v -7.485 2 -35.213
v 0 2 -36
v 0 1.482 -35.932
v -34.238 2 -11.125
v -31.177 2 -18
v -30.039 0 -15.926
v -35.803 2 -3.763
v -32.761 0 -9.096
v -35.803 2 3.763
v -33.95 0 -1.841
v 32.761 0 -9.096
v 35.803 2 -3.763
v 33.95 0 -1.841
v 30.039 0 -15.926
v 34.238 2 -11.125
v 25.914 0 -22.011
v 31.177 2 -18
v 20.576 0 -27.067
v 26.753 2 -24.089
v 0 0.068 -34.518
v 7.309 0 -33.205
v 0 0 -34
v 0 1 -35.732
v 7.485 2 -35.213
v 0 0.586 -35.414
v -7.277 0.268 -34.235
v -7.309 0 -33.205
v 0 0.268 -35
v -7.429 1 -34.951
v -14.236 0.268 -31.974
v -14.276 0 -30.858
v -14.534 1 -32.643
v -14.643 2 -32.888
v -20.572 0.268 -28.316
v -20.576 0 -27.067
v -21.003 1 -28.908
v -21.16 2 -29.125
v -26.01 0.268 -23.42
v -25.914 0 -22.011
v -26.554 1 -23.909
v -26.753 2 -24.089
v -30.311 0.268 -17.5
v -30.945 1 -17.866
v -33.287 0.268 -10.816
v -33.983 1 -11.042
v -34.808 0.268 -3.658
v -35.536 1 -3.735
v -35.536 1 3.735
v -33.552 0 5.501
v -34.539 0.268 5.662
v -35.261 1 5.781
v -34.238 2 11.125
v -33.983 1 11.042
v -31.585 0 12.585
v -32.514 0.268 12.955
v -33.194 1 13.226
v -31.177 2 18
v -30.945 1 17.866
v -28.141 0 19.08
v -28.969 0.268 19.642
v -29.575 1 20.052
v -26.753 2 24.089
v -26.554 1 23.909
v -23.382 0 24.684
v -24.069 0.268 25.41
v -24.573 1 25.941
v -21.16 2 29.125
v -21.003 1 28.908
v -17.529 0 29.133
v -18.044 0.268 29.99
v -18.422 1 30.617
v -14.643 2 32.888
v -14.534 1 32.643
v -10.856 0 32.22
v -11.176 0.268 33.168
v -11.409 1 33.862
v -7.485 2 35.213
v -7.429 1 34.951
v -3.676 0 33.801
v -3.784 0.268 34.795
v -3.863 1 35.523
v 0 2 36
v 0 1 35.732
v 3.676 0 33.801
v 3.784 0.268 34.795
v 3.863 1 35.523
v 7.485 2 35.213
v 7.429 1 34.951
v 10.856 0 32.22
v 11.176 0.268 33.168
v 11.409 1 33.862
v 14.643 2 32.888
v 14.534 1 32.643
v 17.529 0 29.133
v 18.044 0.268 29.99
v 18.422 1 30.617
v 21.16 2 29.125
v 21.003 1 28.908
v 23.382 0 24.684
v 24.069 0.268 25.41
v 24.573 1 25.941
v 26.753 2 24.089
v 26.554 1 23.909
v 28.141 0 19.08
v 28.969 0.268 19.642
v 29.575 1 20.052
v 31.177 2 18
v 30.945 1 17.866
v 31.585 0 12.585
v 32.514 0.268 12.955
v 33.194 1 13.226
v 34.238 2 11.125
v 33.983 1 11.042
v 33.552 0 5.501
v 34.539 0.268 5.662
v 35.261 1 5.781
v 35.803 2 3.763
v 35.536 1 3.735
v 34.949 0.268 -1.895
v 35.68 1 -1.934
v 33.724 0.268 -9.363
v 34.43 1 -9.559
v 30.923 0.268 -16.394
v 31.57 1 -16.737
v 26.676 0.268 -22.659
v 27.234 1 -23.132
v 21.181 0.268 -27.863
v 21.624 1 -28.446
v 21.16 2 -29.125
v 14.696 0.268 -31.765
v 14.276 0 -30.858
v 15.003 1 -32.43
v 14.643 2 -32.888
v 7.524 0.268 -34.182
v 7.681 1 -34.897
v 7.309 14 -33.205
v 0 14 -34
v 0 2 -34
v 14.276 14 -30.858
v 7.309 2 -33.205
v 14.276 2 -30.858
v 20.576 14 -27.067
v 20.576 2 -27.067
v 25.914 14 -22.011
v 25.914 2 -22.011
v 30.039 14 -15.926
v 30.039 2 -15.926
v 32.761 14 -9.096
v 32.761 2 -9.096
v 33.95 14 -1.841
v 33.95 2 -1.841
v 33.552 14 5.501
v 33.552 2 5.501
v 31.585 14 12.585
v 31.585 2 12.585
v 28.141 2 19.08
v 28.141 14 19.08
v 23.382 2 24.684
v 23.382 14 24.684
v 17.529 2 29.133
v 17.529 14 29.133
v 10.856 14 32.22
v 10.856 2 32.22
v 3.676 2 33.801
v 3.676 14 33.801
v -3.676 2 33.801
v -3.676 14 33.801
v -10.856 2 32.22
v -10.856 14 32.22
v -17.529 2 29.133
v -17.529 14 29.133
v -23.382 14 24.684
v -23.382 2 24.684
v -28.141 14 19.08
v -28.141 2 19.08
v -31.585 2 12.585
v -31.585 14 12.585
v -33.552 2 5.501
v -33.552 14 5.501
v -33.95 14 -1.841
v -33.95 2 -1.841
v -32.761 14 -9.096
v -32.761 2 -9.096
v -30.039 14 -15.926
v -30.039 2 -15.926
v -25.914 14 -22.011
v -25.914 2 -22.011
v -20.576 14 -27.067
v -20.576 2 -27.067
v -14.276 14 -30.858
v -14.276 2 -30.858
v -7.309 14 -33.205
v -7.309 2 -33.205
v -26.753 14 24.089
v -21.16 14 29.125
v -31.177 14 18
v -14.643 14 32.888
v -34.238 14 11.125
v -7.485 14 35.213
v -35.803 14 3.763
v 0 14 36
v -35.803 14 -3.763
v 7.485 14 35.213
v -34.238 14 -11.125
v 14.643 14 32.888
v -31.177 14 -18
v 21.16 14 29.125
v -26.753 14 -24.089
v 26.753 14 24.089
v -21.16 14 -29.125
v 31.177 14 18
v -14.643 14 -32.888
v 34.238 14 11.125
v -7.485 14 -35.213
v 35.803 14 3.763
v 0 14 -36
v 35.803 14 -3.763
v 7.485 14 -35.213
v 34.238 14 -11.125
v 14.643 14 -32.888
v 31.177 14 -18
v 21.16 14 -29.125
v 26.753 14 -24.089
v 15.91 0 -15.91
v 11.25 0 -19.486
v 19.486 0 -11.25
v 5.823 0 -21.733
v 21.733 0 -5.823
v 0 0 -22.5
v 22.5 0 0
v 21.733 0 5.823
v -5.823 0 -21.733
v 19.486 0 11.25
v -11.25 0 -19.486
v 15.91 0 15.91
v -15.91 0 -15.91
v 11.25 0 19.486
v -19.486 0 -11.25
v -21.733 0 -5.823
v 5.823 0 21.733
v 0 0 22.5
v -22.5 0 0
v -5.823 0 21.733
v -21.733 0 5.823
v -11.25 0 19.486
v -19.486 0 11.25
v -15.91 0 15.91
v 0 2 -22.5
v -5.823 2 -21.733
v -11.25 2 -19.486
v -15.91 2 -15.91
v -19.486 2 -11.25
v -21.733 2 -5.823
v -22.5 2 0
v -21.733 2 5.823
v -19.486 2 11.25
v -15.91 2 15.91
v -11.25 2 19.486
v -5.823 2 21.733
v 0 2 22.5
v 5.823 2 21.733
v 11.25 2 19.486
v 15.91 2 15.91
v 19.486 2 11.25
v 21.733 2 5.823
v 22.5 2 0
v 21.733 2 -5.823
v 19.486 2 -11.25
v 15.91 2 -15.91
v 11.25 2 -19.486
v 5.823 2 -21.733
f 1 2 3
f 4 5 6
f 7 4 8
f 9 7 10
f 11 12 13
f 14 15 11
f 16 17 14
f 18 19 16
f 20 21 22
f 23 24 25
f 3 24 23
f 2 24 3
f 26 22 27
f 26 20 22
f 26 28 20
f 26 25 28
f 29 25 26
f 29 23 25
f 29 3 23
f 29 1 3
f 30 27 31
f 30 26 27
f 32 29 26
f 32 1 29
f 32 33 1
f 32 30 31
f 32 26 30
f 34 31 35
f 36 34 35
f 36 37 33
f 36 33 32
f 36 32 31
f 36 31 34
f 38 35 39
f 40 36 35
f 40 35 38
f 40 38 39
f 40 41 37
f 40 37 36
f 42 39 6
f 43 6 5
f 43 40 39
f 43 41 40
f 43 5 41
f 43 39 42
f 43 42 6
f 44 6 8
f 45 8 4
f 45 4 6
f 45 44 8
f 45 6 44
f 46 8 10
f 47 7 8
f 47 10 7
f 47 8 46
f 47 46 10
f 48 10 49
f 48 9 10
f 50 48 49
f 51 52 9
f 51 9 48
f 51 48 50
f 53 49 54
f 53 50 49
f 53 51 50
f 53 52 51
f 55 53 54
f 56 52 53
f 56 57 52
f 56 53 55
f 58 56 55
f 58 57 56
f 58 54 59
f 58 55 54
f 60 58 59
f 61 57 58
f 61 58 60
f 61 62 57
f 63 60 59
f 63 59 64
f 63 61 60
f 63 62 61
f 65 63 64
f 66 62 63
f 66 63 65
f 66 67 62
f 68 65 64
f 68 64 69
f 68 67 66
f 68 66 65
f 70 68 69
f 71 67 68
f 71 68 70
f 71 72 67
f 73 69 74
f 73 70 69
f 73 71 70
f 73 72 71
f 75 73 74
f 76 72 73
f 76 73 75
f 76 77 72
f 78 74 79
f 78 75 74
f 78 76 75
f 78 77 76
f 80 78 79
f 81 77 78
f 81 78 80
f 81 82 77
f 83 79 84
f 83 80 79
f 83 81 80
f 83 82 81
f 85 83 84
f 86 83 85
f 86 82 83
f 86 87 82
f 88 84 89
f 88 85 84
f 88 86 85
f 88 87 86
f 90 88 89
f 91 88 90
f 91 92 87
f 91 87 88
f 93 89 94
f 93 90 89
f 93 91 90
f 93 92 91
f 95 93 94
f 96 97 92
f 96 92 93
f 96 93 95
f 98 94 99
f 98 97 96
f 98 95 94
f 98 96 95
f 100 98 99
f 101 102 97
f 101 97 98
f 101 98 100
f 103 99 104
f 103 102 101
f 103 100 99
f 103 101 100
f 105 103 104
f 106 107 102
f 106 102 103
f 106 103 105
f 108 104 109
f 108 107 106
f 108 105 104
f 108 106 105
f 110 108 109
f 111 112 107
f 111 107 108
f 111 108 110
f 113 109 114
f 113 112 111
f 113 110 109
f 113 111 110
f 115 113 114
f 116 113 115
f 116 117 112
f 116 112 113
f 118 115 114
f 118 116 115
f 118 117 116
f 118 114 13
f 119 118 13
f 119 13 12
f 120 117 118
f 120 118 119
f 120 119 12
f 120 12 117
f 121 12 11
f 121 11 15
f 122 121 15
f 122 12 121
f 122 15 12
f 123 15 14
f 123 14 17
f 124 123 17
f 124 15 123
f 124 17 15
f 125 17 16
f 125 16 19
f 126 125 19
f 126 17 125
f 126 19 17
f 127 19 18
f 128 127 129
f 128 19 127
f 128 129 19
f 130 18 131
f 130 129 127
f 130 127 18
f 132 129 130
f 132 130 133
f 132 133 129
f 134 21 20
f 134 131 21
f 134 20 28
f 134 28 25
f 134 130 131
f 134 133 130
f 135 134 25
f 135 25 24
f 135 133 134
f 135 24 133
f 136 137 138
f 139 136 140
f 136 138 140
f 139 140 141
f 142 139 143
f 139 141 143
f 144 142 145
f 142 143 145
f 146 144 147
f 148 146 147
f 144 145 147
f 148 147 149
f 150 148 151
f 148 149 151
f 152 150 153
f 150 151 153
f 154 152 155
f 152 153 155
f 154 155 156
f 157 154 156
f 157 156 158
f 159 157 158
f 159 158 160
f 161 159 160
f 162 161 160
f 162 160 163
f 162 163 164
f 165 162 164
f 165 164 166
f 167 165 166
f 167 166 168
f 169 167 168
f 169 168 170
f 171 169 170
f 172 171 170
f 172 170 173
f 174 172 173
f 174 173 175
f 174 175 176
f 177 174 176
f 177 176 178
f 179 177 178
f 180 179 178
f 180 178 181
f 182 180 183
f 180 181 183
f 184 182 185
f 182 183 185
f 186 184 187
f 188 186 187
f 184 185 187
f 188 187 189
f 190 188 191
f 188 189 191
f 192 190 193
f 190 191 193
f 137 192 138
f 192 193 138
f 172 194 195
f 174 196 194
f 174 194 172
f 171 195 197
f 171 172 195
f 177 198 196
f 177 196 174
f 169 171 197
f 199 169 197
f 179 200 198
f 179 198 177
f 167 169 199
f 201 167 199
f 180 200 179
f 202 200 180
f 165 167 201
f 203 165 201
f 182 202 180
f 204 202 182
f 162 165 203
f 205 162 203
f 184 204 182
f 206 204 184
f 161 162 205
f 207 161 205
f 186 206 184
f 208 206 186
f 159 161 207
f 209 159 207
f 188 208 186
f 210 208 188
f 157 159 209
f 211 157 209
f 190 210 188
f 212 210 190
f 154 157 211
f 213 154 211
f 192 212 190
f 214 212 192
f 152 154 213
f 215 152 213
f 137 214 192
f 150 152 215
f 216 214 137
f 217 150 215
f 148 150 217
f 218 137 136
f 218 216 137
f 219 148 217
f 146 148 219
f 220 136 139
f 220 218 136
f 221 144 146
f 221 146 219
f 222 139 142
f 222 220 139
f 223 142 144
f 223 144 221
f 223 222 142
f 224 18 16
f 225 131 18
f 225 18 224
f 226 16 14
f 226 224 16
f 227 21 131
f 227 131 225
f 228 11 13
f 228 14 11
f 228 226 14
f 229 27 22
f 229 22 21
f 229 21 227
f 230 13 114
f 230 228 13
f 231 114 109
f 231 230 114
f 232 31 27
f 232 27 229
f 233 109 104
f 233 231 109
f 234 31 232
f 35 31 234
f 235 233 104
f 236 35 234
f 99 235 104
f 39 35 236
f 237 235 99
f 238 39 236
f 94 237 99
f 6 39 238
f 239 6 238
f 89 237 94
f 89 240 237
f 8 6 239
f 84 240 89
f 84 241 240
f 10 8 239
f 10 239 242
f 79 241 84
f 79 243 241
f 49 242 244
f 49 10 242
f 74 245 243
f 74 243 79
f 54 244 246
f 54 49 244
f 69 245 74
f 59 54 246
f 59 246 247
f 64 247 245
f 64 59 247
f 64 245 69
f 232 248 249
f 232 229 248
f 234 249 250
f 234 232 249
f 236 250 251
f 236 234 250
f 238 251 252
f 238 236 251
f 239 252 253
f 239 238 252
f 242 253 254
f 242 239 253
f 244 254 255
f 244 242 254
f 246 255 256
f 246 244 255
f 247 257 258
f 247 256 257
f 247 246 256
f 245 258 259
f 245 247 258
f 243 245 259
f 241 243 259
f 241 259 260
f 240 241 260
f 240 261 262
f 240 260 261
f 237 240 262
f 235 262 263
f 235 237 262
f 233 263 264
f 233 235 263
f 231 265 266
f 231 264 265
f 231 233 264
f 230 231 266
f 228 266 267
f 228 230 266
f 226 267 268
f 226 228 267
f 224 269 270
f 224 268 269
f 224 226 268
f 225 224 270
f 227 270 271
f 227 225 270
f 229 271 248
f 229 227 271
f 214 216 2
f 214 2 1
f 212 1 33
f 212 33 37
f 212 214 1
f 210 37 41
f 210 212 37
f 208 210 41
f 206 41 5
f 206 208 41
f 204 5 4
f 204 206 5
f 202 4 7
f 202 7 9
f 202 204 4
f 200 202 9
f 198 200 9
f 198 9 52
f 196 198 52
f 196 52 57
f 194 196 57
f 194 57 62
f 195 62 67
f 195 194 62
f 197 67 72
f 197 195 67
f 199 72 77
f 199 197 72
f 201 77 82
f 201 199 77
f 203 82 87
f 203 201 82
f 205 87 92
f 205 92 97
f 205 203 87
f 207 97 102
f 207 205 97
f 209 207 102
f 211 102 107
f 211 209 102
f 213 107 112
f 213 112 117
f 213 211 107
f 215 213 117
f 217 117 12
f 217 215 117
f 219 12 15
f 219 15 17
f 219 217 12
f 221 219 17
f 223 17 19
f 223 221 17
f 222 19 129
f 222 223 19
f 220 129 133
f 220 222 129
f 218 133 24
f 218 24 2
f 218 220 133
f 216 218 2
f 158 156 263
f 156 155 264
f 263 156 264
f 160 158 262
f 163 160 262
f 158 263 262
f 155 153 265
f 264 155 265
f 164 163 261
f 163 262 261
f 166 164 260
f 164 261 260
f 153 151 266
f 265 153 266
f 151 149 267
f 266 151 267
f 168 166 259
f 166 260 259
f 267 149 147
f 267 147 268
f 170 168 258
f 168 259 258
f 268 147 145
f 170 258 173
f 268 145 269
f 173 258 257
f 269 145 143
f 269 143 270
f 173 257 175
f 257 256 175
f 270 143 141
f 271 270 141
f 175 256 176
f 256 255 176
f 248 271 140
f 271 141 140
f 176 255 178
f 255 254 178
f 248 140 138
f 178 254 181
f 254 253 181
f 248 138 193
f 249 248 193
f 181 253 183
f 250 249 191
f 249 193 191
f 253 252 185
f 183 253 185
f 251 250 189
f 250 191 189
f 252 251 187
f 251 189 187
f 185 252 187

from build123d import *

# Parameters (mm, degrees)
CUT_EXTRUDE1_DEPTH   = 5
SKETCH6_R            = 10.5
CUT_EXTRUDE2_DEPTH   = 5
CUT_EXTRUDE3_DEPTH   = 45
SKETCH8_R            = 40
CUT_EXTRUDE4_DEPTH   = 32
SKETCH9_R            = 34
SKETCH9_R_2          = 24.5
CUT_EXTRUDE5_DEPTH   = 18
SKETCH10_R           = 27
CUT_EXTRUDE6_DEPTH   = 14
INTERSECT1_START     = 14
INTERSECT1_OUTLINE_R = 42
INTERSECT1_DEPTH     = 48


# Read off the part's stored shape, not the designer's step: Intersect1
with BuildPart() as part:
    # Sketch1 → Revolve1 (revolve)
    with BuildSketch(Plane.XY, mode=Mode.PRIVATE) as revolve1_sk:
        with BuildLine():
            Line((22.5, 0), (34, 0))
            ThreePointArc((34, 0), (35.414213562, 0.585786438), (36, 2))
            Line((36, 2), (36, 20))
            Line((36, 20), (40, 20))
            ThreePointArc((40, 20), (41.414213562, 20.585786438), (42, 22))
            Line((42, 22), (42, 57))
            ThreePointArc((42, 57), (40.535533906, 60.535533906), (37, 62))
            Line((37, 62), (0, 62))
            Line((0, 62), (0, 20))
            Line((0, 20), (22.5, 20))
            Line((22.5, 20), (22.5, 0))
        make_face()
    revolve(revolve1_sk.sketch.rotate(Axis((0, 2, 0), (0, 1, 0)), 90), axis=Axis((0, 2, 0), (0, 1, 0)))

    # Sketch5 → Cut-Extrude1 (cut)
    with BuildSketch(Plane(origin=(0, 62, 0), x_dir=(1, 0, 0), z_dir=(0, 1, 0))):
        with BuildLine():
            Line((-42, 0), (-40, 0))
            Line((-40, 0), (40, 0))
            Line((40, 0), (42, 0))
            ThreePointArc((42, 0), (0, 42), (-42, 0))
        make_face()
    extrude(amount=-CUT_EXTRUDE1_DEPTH, mode=Mode.SUBTRACT)

    # Sketch6 → Cut-Extrude2 (cut)
    with BuildSketch(Plane.XY.offset(42)):
        with Locations((-2, 42)):
            Circle(SKETCH6_R)
    extrude(amount=-CUT_EXTRUDE2_DEPTH, mode=Mode.SUBTRACT)

    # Sketch7 → Cut-Extrude3 (cut)
    with BuildSketch(Plane.XZ.offset(-20)):
        with BuildLine():
            Line((-21, 0), (21, 0))
            ThreePointArc((21, 0), (0, -21), (-21, 0))
        make_face()
    extrude(amount=-CUT_EXTRUDE3_DEPTH, mode=Mode.SUBTRACT)

    # Sketch8 → Cut-Extrude4 (cut)
    with BuildSketch(Plane(origin=(0, 54.5, 0), x_dir=(1, 0, 0), z_dir=(0, 1, 0))):
        with Locations(Location((0, 0, 0), (0, 0, 270))):
            Circle(SKETCH8_R)
        with BuildLine():
            Line((22.912878475, -2), (-22.912878475, -2))
            ThreePointArc((-22.912878475, -2), (0, 23), (22.912878475, -2))
        make_face(mode=Mode.SUBTRACT)
    extrude(amount=-CUT_EXTRUDE4_DEPTH, mode=Mode.SUBTRACT)

    # Sketch9 → Cut-Extrude5 (cut)
    with BuildSketch(Plane(origin=(0, 2, 0), x_dir=(-1, 0, 0), z_dir=(0, -1, 0))):
        with Locations(Location((0, 0, 0), (0, 0, 90))):
            Circle(SKETCH9_R)
        with Locations(Location((0, 0, 0), (0, 0, 90))):
            Circle(SKETCH9_R_2, mode=Mode.SUBTRACT)
    extrude(amount=-CUT_EXTRUDE5_DEPTH, mode=Mode.SUBTRACT)

    # Sketch10 → Cut-Extrude6 (cut)
    with BuildSketch(Plane(origin=(0, 2, 0), x_dir=(-1, 0, 0), z_dir=(0, -1, 0))):
        Circle(SKETCH10_R)
    extrude(amount=-CUT_EXTRUDE6_DEPTH, mode=Mode.SUBTRACT)

    # Intersect1 outline → Intersect1 (cut)
    with BuildSketch(Plane(origin=(0, 0, 0), x_dir=(1, 0, 0), z_dir=(0, 1, 0)).offset(INTERSECT1_START)):
        Circle(INTERSECT1_OUTLINE_R)
        with BuildLine():
            ThreePointArc((-21, 0), (0, 21), (21, 0))
            Line((21, 0), (-21, 0))
        make_face(mode=Mode.SUBTRACT)
    extrude(amount=INTERSECT1_DEPTH, mode=Mode.SUBTRACT)


solid = part.part
